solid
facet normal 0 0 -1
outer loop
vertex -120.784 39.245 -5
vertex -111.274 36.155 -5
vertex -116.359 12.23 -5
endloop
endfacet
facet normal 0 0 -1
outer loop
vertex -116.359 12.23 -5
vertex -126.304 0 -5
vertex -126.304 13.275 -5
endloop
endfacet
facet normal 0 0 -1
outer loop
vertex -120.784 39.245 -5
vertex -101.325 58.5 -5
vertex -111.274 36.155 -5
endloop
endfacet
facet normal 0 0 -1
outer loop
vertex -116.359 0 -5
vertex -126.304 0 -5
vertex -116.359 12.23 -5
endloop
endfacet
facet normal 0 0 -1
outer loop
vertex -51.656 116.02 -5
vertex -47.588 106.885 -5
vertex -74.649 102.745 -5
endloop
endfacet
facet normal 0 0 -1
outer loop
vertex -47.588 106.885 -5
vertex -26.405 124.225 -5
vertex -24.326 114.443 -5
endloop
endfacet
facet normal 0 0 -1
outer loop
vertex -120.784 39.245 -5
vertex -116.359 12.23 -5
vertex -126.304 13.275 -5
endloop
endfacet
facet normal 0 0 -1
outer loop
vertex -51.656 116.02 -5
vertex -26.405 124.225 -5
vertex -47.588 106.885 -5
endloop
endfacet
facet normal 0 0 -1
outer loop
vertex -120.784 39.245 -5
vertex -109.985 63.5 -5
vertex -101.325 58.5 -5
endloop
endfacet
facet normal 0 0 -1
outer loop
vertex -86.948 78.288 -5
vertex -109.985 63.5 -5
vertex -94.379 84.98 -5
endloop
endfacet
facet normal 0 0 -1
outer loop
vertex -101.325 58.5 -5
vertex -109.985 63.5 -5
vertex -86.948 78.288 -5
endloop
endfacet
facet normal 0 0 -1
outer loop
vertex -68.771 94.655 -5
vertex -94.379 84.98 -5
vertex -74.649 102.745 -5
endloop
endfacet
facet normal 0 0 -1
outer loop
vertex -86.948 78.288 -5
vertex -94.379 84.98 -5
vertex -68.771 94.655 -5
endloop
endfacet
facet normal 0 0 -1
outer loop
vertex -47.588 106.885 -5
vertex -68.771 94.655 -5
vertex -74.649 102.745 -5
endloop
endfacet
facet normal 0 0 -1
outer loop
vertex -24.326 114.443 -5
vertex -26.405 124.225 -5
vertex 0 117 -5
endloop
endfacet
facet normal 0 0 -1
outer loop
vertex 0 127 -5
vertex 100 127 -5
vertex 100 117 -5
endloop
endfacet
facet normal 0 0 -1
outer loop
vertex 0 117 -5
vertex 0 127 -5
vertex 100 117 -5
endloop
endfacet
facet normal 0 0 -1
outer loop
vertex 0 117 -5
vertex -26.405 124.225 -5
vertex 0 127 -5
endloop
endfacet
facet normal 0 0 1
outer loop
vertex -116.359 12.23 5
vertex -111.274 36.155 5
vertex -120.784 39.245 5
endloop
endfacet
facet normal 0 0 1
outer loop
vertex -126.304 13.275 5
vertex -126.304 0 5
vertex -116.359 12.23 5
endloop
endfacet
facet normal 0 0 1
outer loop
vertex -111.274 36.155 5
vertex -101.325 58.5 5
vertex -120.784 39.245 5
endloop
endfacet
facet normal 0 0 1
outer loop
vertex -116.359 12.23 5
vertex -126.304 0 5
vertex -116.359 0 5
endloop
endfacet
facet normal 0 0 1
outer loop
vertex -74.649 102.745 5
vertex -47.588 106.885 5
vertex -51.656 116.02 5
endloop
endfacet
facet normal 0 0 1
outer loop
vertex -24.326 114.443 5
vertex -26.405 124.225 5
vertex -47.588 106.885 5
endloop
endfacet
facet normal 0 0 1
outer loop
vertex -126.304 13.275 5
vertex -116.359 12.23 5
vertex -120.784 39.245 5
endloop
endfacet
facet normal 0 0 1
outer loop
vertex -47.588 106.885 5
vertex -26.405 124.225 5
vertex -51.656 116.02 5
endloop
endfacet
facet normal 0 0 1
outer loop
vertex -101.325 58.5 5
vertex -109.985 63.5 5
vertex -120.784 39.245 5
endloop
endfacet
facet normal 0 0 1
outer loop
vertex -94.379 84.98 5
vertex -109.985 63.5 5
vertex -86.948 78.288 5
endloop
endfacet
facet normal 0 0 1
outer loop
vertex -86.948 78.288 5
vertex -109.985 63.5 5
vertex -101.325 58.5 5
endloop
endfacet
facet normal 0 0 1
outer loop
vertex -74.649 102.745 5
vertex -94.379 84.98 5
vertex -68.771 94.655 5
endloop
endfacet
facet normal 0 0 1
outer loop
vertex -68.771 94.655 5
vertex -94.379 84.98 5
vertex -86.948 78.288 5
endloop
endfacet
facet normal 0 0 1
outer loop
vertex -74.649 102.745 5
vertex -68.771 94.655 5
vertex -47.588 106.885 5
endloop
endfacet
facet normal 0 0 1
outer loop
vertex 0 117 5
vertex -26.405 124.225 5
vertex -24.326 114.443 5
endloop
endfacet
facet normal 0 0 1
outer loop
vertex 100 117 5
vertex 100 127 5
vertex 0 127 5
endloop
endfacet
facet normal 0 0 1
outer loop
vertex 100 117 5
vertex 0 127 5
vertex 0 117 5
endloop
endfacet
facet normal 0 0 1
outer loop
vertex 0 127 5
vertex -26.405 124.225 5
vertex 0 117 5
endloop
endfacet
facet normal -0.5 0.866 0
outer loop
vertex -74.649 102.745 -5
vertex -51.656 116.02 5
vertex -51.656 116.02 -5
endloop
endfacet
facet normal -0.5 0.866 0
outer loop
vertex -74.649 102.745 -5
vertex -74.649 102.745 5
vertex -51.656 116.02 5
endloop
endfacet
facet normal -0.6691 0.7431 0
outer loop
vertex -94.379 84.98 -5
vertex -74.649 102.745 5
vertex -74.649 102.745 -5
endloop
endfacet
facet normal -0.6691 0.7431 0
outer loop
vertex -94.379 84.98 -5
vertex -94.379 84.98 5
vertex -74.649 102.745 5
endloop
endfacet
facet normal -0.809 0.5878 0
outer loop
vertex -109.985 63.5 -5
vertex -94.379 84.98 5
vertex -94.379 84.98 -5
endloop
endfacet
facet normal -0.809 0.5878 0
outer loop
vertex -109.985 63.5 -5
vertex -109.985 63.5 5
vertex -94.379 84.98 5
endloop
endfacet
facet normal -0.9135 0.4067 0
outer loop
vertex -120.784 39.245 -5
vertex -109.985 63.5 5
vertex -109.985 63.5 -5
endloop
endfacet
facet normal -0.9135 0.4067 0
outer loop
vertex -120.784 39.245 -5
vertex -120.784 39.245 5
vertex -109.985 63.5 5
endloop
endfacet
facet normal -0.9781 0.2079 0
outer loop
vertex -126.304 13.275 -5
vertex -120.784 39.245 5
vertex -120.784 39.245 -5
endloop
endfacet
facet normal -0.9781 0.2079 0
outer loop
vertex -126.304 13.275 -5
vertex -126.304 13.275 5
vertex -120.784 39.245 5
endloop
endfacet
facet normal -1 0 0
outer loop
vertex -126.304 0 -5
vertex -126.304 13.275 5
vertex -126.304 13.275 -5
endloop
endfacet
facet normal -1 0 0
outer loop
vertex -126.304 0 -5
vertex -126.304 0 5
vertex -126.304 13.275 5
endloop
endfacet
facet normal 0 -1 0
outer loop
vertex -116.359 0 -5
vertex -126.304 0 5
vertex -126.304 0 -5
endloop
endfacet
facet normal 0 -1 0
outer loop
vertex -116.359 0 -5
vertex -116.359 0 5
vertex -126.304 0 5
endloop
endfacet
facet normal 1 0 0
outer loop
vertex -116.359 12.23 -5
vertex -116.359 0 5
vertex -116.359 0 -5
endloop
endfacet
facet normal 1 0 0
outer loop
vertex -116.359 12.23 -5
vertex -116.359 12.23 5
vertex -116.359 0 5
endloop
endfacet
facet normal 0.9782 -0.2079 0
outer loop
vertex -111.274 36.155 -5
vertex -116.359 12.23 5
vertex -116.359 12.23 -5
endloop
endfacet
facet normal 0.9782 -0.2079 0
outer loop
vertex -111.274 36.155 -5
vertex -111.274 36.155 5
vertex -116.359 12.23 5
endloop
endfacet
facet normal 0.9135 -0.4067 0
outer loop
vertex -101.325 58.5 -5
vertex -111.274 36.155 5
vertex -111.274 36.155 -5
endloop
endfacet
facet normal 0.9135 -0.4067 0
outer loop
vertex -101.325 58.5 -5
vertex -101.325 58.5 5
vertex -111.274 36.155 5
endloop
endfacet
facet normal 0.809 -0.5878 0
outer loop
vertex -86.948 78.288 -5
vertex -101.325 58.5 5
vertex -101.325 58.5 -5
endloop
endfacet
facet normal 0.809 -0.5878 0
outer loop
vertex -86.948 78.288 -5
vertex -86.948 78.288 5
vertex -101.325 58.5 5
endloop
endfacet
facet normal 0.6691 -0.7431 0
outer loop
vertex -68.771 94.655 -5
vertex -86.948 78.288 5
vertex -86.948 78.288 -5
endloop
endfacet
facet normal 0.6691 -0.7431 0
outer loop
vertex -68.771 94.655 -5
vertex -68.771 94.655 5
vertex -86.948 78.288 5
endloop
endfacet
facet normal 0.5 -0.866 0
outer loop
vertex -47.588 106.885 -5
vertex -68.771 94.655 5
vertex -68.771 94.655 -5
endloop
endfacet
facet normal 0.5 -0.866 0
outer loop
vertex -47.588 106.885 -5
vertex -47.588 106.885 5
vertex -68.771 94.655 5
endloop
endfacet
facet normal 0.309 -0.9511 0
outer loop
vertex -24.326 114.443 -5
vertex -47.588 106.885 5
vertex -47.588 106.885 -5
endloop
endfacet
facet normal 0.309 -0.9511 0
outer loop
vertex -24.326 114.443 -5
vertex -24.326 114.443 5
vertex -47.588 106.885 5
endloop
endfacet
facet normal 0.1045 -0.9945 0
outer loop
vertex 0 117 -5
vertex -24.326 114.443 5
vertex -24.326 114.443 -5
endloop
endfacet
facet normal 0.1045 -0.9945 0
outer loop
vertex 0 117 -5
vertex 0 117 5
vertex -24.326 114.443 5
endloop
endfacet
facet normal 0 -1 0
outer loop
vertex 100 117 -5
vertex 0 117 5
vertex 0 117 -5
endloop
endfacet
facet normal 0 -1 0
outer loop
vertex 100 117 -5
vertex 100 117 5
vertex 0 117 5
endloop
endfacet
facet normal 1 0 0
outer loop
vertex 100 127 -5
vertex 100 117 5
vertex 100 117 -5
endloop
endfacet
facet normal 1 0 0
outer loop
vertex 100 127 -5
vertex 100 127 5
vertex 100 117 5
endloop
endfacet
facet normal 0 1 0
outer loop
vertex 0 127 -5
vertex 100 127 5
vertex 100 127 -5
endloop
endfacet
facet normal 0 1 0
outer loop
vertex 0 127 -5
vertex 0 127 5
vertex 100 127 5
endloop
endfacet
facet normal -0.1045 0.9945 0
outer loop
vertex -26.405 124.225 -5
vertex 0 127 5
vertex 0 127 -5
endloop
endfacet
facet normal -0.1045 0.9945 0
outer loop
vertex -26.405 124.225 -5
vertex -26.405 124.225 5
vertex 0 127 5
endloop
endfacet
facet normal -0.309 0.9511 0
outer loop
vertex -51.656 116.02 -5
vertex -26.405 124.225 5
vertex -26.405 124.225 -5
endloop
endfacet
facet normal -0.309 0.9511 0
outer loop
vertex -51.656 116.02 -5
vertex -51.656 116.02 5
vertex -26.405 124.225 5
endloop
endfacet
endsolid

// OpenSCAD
/*
carboy cleaner stick 
a arch 
*/
//25.4



levels = 7; // number of levels for the recursion

len = 100; // length of the first segment
thickness = 5; // thickness of the first segment

// the identity matrix
identity = [ [ 1, 0, 0, 0 ], [ 0, 1, 0, 0 ], [ 0, 0, 1, 0 ], [ 0, 0, 0, 1 ] ];

// random generator, to generate always the same output for the example,
// this uses a seed for rands() and stores the array of random values in
// the random variable. To generate different output, remove the seed or
// replace the function rnd() to just call rands(s, e, 1)[0].
rcnt = 1000;
random = rands(0, 1, rcnt, 18);
function rnd(s, e, r) = random[r % rcnt] * (e - s) + s;

// generate 4x4 translation matrix
function mt(x, y) = [ [ 1, 0, 0, x ], [ 0, 1, 0, y ], [ 0, 0, 1, 0 ], [ 0, 0, 0, 1 ] ];

// generate 4x4 rotation matrix around Z axis
function mr(a) = [ [ cos(a), -sin(a), 0, 0 ], [ sin(a), cos(a), 0, 0 ], [ 0, 0, 1, 0 ], [ 0, 0, 0, 1 ] ];

module tree(length, thickness, count, m = identity, r = 1) {
    color([0, 1 - (0.8 / levels * count), 0])
        multmatrix(m)
    {
            square([thickness, length]);

    if (count > 0) {
        tree(.75 * length, 0.8 * thickness, count - 1, mt(0, length) * mr(90), 8 * r);
        tree(.75 * length, 0.8 * thickness, count - 1, mt(0, length) * mr(-90), 8 * r + 4);
    }
    echo (rnd(0.6, 0.8, r));
    }
}
module tree2(length, thickness, count, m = identity ) {
    color([0, 1 - (0.8 / levels * count), 0])
        multmatrix(m)
    {
            square([thickness, length],center = true);

    if (count > 0) {
        tree2(.70 * length, 0.8 * thickness, count - 1, mt(0, length/2) * mr(90) );
        tree2(.70 * length, 0.8 * thickness, count - 1, mt(0, length/2) * mr(-90));
    }
  
    }
}
function polar(r,theta)   = r*[sin(theta), cos(theta)]; 
module ArchClipingPloy(Rad, thickness,StartAngle,endAngle) 
{echo(StartAngle,endAngle);
    pointA=[0,0];
    
       pointS=polar(Rad*2,StartAngle);
        pointE=polar(Rad*2,endAngle);
        pointOut=polar(Rad*2,(endAngle+StartAngle)/2);
    pointOutS=polar(Rad*2,(StartAngle+(endAngle+StartAngle)/2)/2);
     pointOutE=polar(Rad*2,(endAngle+(endAngle+StartAngle)/2)/2);
   // echo(pointA,pointS,pointE,pointOut,(endAngle+StartAngle)/2,(StartAngle+(endAngle+StartAngle)/2)/2,(endAngle+(endAngle+StartAngle)/2)/2);
    polygon([pointA,pointS,,pointOutS,pointOut,pointOutE,pointE],paths=[[0,1,2,3,4,5]]);
    }
module Arch(Rad, thickness,StartAngle,endAngle) {
   echo("Arch", Rad, thickness,StartAngle,endAngle);
    intersection()
    {
        difference ()
        {        
          circle(Rad ,center = true);
         circle(Rad-thickness,center = true);
           
       }
        ArchClipingPloy(Rad, thickness,StartAngle,endAngle) ;
       
    }
    
 }



linear_extrude(height=10, center=true, convexity=10, twist=0) {
   rotate([0, 0, 1],a=90) {
            Arch(254/2,10,0,90);
   }
    translate([50, 254/2-5, 0]) {
        square(size=[100, 10], center=true);
    }
}
